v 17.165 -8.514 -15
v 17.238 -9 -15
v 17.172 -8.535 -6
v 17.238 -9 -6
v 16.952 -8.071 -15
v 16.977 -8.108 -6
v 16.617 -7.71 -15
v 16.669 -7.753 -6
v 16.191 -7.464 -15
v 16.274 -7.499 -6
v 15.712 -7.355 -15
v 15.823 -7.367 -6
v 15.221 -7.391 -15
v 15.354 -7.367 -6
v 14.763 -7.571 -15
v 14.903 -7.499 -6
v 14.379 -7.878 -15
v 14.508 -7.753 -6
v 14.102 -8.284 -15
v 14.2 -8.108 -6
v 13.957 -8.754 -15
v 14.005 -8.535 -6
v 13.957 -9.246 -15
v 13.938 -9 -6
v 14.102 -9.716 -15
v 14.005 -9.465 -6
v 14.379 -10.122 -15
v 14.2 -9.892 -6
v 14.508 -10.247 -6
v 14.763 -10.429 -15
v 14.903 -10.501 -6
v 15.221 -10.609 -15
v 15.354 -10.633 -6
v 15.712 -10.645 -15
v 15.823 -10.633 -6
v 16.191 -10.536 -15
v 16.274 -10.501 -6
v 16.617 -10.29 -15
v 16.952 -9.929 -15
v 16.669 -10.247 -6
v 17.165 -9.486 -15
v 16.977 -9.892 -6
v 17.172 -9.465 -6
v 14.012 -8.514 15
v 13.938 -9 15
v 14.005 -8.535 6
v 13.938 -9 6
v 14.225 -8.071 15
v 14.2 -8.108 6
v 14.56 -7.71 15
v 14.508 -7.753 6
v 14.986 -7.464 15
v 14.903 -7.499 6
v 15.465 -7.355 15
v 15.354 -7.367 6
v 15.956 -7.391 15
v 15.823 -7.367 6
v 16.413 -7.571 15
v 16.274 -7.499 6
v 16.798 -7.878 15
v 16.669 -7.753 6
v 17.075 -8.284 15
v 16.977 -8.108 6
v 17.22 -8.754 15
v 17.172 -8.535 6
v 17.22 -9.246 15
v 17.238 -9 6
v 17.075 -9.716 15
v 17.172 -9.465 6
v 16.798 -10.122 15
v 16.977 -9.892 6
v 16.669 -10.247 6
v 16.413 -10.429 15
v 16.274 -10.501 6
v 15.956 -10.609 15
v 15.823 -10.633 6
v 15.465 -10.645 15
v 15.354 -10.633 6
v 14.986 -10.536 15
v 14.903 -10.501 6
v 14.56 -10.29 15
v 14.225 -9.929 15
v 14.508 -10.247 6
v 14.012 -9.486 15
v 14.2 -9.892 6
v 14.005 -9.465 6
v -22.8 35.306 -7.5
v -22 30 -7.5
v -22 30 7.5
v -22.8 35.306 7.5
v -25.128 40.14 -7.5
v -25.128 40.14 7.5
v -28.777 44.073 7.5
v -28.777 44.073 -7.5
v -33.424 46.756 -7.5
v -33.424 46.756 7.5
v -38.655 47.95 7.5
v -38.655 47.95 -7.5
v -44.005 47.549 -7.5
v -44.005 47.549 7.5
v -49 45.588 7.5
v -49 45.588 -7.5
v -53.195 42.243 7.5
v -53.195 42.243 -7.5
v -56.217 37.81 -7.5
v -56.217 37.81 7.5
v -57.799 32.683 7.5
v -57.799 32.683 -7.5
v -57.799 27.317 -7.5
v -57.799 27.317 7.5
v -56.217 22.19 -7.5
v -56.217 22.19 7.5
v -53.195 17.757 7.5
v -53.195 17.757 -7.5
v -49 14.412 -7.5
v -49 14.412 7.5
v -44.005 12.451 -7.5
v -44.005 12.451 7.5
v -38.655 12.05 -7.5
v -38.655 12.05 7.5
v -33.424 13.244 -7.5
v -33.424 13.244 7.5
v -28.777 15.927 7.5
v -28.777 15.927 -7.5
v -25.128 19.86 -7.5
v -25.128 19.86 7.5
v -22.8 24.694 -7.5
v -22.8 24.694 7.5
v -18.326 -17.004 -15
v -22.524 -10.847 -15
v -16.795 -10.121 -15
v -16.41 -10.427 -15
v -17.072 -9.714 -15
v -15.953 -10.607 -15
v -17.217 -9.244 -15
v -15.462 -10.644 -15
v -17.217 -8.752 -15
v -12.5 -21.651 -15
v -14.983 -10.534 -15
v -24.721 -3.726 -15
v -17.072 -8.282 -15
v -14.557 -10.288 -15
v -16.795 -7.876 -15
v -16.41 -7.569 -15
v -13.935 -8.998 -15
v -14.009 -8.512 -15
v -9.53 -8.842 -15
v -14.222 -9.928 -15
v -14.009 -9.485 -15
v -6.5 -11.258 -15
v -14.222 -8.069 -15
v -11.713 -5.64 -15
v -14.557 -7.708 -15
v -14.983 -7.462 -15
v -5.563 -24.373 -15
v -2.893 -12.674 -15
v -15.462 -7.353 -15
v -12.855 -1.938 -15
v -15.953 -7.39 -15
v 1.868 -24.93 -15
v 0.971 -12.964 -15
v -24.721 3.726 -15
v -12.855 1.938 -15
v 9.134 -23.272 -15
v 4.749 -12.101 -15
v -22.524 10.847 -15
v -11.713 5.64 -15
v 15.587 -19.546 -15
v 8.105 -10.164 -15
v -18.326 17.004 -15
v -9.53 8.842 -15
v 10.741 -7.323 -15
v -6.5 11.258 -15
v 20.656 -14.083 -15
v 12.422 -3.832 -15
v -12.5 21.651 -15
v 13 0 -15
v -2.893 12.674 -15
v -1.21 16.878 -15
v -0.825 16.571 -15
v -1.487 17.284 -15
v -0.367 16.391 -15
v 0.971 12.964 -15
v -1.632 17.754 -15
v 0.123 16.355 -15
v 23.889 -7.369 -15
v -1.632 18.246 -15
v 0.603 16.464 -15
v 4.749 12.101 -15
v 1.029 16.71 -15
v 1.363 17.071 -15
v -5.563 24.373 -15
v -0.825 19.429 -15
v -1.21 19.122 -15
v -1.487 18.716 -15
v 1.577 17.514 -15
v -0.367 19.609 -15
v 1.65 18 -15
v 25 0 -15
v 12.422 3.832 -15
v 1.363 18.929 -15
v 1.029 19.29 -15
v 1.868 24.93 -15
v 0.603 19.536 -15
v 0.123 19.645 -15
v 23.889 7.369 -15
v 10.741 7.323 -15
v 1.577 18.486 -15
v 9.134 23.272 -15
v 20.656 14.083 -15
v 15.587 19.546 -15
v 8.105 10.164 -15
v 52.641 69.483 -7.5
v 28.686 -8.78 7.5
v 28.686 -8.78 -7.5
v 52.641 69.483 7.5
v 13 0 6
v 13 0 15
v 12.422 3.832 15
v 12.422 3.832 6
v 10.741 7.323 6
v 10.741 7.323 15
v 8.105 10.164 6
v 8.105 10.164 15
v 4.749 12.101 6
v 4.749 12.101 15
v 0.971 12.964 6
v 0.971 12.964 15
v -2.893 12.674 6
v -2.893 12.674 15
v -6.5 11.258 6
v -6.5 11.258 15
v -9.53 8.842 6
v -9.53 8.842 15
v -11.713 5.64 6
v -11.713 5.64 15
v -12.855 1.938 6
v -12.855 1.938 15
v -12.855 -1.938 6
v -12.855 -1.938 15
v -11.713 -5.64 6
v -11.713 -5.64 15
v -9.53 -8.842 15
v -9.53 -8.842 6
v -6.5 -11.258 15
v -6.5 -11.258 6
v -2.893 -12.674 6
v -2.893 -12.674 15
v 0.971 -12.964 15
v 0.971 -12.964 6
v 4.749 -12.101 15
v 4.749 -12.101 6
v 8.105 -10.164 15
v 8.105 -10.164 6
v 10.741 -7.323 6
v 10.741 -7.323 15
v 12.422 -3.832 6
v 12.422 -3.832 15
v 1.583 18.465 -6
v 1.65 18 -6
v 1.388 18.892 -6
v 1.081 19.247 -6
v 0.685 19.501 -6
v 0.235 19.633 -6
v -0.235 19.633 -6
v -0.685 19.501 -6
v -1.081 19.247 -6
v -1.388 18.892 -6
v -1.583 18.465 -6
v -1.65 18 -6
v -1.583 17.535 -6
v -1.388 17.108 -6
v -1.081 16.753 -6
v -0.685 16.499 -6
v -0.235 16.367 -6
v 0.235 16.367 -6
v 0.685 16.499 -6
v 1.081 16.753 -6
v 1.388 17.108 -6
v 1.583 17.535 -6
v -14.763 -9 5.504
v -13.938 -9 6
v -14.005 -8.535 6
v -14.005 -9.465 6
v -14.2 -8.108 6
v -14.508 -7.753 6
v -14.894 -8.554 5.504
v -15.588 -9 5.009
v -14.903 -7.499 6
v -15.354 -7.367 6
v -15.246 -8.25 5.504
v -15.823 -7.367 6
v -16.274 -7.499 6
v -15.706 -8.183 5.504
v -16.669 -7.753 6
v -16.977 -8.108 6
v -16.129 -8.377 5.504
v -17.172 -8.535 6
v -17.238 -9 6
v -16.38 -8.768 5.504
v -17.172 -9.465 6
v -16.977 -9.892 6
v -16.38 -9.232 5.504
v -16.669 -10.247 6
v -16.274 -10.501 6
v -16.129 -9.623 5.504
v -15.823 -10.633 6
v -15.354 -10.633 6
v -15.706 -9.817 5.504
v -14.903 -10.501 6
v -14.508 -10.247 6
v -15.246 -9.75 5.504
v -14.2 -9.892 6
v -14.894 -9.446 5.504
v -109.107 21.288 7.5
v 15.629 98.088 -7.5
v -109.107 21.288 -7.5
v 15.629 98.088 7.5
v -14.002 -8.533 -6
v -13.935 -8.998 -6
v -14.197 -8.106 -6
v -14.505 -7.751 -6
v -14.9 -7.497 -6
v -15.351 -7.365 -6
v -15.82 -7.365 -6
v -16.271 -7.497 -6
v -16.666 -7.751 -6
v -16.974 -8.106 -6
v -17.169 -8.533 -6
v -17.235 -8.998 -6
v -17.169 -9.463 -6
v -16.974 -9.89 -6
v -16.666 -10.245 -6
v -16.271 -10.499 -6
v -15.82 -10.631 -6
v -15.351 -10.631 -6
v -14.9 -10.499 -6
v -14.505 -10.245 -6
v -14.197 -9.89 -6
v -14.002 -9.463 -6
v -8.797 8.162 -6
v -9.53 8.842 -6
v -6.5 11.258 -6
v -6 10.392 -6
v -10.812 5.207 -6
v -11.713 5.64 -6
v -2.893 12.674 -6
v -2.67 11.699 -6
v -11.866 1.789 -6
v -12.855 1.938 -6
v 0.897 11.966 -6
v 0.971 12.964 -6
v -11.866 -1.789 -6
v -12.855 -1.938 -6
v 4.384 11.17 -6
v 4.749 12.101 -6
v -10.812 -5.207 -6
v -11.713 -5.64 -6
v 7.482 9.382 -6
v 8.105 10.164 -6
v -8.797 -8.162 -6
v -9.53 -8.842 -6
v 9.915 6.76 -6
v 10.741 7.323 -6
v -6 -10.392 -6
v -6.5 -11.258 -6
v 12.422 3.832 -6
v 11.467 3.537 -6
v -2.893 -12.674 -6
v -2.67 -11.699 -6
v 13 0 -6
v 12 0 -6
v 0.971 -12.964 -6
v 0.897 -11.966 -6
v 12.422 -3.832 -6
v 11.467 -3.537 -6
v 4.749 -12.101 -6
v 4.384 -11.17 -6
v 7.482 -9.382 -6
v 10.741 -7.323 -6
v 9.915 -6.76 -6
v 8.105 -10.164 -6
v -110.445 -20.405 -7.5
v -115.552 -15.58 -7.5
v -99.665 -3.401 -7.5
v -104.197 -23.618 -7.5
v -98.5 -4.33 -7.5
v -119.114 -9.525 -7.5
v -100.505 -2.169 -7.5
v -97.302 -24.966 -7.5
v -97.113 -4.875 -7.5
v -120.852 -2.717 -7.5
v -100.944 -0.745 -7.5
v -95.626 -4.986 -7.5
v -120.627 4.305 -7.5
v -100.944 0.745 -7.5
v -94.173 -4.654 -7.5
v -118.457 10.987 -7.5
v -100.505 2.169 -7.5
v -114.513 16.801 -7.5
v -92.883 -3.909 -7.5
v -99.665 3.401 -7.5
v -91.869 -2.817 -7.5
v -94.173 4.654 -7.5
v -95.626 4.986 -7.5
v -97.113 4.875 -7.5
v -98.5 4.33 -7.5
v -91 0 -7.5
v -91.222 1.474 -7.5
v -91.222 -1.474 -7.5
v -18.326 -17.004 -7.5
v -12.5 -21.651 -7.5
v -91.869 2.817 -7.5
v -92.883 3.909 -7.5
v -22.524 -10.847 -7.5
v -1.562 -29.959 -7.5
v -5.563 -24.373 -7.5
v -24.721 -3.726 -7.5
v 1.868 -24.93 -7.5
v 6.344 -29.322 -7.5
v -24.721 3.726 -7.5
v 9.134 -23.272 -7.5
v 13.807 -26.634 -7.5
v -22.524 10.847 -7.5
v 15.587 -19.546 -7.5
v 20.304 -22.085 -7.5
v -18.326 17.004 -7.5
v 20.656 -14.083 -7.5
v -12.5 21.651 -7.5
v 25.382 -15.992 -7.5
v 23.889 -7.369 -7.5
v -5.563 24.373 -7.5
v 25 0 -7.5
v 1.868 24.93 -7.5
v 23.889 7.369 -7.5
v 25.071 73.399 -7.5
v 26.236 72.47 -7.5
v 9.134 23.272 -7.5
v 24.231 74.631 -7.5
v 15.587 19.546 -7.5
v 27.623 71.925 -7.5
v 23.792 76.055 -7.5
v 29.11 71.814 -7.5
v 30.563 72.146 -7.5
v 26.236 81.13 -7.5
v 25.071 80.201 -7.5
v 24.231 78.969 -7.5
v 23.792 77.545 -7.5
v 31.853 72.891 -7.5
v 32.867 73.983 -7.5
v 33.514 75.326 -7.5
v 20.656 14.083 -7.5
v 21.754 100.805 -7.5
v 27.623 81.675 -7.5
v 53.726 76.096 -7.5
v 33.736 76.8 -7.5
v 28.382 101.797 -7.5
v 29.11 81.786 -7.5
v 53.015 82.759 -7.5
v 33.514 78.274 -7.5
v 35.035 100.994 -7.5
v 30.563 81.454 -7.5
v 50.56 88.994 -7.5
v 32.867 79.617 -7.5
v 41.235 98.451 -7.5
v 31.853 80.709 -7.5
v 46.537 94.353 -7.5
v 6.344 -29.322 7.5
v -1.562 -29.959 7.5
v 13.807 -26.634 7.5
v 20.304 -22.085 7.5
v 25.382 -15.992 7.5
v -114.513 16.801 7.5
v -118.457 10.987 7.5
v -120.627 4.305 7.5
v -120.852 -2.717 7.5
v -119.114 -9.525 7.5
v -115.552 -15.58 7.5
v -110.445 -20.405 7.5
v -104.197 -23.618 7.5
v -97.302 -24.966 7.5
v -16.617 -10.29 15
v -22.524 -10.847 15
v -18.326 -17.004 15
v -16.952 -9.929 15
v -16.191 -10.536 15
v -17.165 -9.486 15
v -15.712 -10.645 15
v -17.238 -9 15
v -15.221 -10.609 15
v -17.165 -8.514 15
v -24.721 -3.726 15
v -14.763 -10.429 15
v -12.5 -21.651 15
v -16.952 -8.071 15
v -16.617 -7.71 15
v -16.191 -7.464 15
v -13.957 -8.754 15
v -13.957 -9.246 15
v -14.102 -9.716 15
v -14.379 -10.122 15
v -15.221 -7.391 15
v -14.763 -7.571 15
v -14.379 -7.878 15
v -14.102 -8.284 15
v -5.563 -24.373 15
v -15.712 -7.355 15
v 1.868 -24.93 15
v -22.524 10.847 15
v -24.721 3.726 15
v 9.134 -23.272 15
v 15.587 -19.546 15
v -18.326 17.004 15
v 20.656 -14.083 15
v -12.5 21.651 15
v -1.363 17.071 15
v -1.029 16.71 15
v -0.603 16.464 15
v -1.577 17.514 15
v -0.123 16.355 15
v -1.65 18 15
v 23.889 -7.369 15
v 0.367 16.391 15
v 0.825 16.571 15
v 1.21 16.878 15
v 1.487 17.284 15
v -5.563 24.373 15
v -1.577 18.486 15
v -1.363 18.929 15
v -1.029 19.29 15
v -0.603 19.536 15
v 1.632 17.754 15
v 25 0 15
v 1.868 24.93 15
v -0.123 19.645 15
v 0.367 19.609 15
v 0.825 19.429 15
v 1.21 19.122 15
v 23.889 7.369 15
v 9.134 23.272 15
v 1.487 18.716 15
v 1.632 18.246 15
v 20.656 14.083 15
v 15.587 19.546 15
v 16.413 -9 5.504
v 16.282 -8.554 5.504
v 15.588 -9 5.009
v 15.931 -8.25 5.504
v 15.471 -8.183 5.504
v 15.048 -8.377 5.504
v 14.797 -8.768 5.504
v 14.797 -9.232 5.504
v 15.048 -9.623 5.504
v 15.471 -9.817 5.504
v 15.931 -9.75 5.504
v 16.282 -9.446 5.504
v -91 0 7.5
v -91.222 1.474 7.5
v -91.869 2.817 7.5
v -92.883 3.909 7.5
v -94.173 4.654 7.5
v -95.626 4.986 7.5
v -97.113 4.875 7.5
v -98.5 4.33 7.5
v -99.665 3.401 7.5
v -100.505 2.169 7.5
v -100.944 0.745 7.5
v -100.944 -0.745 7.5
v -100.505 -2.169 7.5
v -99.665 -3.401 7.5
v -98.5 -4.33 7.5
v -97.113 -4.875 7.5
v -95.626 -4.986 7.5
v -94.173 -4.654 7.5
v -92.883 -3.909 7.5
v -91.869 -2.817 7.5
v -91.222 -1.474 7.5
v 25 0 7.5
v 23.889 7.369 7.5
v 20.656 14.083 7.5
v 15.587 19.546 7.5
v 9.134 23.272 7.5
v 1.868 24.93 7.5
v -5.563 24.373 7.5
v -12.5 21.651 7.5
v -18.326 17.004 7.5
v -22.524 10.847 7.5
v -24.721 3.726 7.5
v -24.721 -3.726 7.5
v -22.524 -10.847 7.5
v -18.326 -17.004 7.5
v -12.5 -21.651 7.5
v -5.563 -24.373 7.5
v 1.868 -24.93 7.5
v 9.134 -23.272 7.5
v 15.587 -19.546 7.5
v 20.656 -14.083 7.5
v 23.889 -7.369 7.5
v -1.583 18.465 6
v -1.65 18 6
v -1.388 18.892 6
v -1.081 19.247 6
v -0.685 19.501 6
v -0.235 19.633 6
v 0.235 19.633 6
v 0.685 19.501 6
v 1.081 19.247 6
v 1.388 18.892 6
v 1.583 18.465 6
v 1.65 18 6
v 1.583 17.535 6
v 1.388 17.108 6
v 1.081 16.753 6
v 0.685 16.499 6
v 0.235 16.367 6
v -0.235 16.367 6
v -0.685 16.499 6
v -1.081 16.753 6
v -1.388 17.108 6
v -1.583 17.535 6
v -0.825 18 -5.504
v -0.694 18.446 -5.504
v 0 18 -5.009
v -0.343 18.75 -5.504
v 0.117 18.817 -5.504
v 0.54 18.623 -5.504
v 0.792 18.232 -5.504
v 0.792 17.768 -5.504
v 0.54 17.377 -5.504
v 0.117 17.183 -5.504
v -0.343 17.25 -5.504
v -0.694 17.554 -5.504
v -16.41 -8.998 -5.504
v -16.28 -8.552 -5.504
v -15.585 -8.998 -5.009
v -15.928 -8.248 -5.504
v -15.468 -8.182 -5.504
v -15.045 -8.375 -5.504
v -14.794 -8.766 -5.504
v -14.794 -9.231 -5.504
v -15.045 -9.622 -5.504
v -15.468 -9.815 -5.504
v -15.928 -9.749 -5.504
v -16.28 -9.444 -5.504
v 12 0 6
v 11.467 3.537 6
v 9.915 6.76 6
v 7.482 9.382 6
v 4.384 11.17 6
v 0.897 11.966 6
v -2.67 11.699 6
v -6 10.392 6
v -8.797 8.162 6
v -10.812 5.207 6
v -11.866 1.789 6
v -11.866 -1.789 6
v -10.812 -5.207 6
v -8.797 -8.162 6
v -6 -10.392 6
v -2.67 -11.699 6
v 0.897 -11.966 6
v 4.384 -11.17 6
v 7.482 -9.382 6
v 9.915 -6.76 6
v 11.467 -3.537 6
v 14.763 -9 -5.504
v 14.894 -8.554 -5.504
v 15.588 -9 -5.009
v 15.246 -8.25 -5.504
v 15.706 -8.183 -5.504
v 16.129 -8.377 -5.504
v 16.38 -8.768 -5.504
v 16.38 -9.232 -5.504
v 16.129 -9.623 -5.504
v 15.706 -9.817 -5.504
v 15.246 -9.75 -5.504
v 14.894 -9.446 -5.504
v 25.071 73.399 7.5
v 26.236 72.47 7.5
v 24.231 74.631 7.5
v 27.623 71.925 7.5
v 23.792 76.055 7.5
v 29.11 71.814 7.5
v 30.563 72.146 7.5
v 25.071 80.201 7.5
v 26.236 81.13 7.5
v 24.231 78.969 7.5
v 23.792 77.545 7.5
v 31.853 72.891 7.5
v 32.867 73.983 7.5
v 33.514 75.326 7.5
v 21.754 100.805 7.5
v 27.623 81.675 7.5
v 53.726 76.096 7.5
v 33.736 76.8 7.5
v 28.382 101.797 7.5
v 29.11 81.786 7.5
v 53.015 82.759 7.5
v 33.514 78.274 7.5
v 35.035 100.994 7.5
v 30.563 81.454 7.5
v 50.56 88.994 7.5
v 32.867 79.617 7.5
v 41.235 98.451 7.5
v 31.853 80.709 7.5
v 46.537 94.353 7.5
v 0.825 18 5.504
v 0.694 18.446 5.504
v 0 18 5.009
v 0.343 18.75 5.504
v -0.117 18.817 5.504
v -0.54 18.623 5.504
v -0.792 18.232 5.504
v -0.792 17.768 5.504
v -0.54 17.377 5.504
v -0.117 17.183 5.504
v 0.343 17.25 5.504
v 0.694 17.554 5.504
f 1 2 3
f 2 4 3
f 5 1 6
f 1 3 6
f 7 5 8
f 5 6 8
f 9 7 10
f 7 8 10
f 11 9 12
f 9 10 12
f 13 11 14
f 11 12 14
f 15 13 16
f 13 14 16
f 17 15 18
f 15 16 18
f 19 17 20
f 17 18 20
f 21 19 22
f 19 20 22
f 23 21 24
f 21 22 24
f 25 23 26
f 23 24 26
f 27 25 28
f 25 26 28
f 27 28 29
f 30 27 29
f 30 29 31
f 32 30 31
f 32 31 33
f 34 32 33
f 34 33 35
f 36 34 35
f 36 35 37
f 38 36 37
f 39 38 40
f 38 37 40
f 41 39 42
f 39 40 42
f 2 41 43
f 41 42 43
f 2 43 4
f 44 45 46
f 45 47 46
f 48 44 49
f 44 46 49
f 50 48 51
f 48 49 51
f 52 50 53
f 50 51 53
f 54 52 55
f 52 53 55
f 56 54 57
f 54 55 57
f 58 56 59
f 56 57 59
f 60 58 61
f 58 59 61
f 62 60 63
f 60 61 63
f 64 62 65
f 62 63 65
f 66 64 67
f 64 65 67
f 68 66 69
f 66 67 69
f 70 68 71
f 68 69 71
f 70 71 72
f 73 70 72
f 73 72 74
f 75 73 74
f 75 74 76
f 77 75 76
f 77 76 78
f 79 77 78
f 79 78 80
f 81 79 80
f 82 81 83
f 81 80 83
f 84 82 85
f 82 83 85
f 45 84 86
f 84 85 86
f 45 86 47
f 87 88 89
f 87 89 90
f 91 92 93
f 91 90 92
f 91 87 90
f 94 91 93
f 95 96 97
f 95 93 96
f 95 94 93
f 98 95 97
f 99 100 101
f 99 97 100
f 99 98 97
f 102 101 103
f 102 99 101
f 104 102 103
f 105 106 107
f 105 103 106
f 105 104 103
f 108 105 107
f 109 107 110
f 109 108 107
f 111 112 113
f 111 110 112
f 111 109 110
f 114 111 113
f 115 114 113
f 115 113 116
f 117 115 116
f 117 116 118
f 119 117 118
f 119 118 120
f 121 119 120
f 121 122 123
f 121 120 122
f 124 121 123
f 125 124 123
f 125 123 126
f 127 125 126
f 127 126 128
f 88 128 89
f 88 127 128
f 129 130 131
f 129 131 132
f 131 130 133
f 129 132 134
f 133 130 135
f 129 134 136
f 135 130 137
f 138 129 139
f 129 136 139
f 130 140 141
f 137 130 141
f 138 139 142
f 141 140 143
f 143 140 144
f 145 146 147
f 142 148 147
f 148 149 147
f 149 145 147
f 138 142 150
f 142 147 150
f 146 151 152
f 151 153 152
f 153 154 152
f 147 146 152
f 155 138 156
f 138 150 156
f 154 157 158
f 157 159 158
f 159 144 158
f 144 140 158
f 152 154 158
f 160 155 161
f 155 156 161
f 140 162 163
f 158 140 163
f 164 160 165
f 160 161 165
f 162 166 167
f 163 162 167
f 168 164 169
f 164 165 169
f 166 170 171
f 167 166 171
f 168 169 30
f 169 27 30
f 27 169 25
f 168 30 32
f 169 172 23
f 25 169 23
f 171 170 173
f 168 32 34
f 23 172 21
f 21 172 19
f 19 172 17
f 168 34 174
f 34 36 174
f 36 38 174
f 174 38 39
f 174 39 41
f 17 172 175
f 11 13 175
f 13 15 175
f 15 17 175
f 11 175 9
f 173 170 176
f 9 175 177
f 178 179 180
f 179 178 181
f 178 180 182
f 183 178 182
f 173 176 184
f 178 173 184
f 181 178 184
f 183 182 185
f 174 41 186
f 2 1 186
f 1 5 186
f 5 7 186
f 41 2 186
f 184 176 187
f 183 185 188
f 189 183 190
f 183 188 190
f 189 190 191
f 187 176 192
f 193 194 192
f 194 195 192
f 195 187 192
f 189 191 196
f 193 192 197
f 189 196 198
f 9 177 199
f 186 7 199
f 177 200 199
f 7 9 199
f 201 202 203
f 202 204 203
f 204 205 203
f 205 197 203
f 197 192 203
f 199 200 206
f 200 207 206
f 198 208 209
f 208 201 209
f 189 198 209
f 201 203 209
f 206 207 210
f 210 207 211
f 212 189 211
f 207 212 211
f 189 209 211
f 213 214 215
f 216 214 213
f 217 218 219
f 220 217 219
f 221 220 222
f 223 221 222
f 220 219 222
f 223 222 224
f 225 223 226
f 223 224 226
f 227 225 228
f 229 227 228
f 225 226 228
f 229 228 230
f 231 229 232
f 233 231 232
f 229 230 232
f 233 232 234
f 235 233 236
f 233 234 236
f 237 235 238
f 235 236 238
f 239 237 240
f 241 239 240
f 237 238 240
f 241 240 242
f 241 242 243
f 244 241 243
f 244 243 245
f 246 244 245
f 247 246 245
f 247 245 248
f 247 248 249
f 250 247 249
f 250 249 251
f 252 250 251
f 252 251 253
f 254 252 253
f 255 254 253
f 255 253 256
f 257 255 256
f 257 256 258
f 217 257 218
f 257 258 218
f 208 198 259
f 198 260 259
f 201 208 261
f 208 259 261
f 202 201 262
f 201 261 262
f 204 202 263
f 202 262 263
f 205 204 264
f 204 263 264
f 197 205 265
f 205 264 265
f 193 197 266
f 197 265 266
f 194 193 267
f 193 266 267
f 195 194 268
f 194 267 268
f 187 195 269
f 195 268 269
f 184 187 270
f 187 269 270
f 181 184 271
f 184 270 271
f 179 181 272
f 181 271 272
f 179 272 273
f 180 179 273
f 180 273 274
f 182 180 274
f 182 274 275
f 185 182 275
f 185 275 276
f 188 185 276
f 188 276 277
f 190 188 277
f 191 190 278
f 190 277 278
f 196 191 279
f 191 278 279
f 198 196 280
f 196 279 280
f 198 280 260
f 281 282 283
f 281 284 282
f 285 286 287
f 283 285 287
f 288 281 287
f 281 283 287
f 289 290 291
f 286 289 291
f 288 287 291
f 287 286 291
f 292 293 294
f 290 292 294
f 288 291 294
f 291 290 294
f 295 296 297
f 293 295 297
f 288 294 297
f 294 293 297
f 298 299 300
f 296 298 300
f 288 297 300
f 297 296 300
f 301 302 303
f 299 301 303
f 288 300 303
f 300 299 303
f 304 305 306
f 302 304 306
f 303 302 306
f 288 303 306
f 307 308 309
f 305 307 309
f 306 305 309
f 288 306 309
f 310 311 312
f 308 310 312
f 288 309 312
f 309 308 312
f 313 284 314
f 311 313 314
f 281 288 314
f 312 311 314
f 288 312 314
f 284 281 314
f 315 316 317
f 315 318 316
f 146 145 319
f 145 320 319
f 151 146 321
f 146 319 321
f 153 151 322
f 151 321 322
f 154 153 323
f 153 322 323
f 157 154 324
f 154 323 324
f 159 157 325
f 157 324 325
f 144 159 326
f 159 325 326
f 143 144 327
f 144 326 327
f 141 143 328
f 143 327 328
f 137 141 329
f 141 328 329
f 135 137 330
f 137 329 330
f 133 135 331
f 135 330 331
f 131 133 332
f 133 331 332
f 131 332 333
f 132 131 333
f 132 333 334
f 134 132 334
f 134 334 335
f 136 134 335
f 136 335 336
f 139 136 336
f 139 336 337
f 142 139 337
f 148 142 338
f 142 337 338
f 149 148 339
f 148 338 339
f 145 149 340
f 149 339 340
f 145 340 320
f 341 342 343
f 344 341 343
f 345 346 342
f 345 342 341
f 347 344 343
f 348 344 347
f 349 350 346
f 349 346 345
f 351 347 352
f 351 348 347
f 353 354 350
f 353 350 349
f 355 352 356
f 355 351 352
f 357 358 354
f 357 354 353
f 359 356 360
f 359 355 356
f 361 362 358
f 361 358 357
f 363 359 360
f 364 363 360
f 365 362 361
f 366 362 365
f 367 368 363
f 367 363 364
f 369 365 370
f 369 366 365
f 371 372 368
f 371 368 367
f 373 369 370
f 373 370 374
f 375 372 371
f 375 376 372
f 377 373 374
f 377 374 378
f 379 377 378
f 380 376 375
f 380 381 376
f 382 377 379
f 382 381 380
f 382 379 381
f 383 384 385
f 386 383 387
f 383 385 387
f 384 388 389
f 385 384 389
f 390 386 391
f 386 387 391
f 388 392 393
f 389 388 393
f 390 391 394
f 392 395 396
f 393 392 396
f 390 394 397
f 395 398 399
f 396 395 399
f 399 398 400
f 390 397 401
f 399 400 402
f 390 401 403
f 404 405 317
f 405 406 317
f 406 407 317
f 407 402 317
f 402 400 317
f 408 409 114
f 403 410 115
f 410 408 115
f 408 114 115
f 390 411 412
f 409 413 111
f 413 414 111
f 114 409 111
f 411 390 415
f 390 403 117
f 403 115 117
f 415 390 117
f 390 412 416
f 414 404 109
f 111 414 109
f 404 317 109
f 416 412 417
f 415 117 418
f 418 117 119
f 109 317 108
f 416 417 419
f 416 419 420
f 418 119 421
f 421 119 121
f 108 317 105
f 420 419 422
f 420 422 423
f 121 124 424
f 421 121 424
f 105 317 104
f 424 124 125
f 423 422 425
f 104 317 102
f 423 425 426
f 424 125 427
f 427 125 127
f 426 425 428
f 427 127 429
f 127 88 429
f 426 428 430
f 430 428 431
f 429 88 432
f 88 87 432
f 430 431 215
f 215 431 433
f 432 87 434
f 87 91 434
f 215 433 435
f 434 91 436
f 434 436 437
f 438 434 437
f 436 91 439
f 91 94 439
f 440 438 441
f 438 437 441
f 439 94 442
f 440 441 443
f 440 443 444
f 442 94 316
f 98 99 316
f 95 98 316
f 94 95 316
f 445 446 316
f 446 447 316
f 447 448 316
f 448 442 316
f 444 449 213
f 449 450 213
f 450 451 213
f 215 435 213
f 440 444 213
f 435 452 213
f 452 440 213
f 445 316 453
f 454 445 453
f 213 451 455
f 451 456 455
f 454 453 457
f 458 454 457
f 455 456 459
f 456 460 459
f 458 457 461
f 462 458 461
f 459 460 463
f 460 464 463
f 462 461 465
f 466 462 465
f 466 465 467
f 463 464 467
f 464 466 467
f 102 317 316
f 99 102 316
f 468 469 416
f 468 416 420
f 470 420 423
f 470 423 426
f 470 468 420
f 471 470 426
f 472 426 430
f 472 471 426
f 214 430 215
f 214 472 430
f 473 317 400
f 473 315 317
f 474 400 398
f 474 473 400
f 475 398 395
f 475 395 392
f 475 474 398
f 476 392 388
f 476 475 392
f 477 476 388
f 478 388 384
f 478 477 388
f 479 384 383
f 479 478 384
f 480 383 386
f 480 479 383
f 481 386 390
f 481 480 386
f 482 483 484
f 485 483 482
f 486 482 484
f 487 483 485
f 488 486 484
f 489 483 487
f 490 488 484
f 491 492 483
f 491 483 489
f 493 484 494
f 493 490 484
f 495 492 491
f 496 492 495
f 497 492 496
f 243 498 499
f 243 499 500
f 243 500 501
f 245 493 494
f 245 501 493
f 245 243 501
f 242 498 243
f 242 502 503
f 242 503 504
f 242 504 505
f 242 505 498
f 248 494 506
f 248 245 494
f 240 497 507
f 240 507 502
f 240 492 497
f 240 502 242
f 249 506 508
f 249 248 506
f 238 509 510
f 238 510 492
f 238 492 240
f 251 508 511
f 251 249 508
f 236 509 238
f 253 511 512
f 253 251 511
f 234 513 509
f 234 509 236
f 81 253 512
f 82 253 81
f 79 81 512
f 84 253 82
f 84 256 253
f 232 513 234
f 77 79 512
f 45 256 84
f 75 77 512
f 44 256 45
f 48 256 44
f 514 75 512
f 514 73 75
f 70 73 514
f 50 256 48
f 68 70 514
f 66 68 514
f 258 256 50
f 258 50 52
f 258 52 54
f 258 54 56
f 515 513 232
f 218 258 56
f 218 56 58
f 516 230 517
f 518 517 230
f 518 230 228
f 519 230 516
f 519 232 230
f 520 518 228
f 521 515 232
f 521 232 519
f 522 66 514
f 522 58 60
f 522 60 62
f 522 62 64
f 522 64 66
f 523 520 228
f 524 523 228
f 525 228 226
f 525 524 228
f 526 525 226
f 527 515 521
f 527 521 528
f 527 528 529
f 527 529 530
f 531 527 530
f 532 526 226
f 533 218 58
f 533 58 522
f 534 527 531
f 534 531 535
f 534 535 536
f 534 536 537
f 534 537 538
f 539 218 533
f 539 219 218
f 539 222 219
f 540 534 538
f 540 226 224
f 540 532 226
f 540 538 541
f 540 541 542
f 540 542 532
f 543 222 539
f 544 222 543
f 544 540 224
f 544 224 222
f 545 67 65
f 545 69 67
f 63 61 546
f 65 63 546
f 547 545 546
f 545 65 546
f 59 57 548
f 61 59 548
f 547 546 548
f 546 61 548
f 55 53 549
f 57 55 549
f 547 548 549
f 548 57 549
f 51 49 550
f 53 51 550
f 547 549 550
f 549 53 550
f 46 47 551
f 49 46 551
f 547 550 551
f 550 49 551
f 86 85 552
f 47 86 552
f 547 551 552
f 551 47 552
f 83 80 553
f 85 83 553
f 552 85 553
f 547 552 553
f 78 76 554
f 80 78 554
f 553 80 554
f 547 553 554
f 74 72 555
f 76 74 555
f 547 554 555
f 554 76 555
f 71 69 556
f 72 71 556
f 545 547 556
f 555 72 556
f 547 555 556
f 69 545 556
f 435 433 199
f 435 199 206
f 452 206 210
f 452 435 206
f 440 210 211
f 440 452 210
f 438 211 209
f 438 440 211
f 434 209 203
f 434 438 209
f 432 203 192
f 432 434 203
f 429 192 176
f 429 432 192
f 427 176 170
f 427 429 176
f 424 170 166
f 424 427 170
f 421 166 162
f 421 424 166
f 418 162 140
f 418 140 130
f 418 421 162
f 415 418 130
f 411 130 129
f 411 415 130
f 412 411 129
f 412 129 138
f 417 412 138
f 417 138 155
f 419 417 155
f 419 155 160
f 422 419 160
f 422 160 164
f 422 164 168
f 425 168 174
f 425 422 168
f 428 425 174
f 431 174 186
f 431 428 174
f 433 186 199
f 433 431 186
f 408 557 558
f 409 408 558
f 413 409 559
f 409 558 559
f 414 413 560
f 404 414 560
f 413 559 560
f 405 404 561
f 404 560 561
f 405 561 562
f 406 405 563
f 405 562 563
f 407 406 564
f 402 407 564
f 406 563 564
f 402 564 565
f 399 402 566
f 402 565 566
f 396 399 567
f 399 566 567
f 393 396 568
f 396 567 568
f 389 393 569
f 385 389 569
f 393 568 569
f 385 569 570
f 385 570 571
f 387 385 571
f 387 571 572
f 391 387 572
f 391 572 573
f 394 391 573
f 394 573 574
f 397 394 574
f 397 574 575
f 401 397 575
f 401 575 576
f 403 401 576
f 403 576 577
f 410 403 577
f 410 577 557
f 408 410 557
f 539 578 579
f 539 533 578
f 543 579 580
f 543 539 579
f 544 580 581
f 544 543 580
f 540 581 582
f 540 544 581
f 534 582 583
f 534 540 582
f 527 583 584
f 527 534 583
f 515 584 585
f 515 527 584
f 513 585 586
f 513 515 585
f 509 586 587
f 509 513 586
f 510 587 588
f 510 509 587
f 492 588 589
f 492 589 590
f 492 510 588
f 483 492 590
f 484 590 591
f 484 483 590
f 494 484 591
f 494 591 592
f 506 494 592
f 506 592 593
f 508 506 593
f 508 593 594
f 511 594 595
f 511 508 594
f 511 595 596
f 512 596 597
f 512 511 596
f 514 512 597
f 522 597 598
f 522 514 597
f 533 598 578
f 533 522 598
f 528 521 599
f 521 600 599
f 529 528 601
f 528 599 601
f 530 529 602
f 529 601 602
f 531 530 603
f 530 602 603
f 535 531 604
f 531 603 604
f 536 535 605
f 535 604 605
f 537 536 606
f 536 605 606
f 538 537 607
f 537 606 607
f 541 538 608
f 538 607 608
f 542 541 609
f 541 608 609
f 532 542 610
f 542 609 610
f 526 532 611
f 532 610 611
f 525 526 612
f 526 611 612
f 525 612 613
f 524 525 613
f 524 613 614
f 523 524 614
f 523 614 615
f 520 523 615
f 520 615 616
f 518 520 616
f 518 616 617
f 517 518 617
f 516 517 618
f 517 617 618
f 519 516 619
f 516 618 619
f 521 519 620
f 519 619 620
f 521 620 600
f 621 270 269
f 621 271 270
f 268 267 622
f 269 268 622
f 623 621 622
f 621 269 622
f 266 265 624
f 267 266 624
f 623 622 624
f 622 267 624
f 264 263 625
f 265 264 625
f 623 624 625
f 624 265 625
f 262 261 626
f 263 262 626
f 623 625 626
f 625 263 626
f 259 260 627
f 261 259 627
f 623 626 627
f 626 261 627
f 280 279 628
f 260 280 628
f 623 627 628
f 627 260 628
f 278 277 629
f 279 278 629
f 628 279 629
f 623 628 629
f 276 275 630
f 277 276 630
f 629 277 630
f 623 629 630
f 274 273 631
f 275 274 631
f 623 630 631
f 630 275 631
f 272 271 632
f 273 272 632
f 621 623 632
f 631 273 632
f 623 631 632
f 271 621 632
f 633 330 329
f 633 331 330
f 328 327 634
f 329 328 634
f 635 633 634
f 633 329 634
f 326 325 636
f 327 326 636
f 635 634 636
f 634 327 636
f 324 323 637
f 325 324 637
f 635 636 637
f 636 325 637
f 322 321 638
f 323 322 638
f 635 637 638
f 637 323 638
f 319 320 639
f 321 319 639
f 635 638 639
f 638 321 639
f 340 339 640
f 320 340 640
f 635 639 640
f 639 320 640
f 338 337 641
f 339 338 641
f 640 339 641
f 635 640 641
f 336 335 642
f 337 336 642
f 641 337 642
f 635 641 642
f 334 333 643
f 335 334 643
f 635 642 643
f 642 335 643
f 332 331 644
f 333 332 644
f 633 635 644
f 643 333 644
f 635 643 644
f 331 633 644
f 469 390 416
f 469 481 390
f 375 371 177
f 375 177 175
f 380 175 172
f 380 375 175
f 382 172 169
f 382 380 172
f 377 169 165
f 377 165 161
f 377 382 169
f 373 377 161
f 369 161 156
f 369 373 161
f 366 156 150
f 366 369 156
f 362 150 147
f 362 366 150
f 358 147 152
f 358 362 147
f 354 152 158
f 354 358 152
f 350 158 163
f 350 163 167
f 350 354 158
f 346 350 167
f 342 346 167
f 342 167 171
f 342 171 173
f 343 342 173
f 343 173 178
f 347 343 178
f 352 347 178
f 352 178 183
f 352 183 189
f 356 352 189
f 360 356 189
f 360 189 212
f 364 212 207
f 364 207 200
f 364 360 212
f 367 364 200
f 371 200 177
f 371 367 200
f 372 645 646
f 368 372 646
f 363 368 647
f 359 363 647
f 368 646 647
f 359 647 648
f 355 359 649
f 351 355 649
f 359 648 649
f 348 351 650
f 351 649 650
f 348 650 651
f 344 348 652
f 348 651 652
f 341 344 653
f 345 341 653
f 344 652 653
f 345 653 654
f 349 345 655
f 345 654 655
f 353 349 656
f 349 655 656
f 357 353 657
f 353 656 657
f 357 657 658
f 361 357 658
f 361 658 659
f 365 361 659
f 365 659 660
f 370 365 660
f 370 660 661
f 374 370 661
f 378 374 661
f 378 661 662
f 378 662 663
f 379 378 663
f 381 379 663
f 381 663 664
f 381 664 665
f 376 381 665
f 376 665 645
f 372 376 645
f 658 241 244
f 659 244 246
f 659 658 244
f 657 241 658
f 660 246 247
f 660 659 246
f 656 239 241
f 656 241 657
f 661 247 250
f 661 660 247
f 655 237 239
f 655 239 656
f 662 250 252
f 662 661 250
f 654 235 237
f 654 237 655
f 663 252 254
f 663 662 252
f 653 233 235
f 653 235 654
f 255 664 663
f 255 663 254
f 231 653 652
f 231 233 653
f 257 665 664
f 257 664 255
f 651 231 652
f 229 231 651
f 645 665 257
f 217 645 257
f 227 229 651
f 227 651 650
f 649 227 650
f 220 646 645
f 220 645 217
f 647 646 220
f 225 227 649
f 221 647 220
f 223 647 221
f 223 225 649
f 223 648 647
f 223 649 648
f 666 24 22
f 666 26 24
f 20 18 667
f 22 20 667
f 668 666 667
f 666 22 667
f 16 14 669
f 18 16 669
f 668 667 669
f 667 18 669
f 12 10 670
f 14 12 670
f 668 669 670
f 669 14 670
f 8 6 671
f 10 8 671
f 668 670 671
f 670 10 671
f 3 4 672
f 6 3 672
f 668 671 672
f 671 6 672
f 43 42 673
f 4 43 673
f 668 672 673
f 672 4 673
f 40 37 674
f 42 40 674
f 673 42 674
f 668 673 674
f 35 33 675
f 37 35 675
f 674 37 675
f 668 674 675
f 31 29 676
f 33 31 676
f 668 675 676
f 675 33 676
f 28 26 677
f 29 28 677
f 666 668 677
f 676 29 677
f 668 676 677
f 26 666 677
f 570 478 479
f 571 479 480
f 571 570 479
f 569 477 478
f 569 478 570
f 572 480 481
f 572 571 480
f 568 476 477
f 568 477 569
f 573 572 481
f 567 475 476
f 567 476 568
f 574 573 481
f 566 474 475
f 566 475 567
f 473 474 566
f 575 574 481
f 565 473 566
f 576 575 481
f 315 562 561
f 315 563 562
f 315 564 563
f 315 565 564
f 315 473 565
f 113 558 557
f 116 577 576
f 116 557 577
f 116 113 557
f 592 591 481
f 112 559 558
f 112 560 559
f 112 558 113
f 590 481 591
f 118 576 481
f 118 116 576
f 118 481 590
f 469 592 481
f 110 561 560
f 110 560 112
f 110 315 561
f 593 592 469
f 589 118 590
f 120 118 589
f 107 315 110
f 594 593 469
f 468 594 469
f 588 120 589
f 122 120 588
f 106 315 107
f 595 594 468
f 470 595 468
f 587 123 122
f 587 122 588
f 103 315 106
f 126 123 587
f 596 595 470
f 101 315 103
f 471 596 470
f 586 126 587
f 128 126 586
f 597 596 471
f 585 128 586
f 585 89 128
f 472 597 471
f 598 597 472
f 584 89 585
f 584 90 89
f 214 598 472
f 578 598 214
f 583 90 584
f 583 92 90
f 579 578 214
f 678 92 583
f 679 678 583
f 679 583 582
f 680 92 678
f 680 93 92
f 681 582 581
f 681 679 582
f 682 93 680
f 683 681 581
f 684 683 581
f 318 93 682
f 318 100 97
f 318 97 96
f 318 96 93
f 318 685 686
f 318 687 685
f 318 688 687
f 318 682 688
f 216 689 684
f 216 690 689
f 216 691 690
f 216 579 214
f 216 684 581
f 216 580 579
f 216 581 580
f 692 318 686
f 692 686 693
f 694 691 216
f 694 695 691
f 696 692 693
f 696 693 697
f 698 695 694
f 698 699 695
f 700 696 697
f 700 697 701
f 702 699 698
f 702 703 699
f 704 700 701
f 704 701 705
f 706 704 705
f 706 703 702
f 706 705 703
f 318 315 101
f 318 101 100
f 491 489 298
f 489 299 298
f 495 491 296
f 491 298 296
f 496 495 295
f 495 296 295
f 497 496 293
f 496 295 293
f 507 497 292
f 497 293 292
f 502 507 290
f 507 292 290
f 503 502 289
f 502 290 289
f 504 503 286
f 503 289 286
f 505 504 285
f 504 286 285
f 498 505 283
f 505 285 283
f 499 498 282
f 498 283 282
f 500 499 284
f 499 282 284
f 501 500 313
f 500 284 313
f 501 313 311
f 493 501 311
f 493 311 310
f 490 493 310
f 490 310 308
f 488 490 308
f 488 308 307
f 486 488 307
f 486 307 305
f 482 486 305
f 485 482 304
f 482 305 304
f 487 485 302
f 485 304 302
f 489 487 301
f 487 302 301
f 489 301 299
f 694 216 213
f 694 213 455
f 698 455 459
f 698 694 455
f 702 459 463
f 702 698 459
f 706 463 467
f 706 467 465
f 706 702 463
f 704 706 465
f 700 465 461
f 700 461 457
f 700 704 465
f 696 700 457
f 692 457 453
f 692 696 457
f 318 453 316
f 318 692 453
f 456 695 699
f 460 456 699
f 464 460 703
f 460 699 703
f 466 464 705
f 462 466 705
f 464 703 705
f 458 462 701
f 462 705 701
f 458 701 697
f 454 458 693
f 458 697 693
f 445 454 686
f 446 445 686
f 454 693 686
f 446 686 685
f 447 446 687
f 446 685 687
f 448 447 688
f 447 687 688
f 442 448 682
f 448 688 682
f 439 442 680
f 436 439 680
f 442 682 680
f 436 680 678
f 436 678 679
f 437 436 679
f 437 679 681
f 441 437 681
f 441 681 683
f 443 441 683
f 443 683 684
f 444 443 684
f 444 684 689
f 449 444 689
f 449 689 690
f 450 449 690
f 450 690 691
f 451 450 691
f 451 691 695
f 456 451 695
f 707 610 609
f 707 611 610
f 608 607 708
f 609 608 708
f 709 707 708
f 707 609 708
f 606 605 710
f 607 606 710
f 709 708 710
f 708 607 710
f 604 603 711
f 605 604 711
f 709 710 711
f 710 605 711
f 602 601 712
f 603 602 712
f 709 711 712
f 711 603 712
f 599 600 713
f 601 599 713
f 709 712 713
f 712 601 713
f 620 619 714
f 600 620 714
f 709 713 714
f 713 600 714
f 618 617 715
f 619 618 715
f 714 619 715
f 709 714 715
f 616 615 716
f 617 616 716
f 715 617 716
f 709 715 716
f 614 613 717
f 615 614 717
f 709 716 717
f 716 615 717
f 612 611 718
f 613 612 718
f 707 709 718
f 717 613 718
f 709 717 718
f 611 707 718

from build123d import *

# Parameters (mm, degrees)
BASELINE_BODY_DEPTH          = 7.5
SKETCH3_R                    = 5
CUT_EXTRUDE1_DEPTH           = 159.837149307
SKETCH4_R                    = 25
BOSS_EXTRUDE2_DEPTH          = 15
SKETCH5_R                    = 12
CUT_EXTRUDE2_DEPTH           = 161.947941894
SKETCH6_R                    = 13
CUT_EXTRUDE3_DEPTH           = 9
CUT_EXTRUDE4_START           = -9
SKETCH7_R                    = 13
CUT_EXTRUDE4_DEPTH           = 9
M4_TAPPED_HOLE6_D            = 3.3
M4_TAPPED_HOLE6_DEPTH        = 9
M4_TAPPED_HOLE6_TIP          = 0.991420021
M4_TAPPED_HOLE8_D            = 3.3
M4_TAPPED_HOLE8_DEPTH        = 9
M4_TAPPED_HOLE8_TIP          = 0.991420021
LIGHTENING_WINDOW_DEPTH      = 160.720036314
LIGHTENING_WINDOW_DEPTH_BACK = 160.720036314
SKETCH17_R                   = 18


with BuildPart() as part:
    # Rocker_Profile → Baseline_Body (new, symmetric)
    with BuildSketch(Plane.XY):
        with BuildLine():
            Line((-97.302083333, -24.966068553), (-1.5625, -29.959282264))
            ThreePointArc((-1.5625, -29.959282264), (17.206458335, -24.57514581), (28.686326507, -8.780357142))
            Line((28.686326507, -8.780357142), (52.641312178, 69.483035715))
            ThreePointArc((52.641312178, 69.483035715), (44.023831603, 96.580885487), (15.628732451, 98.088458997))
            Line((15.628732451, 98.088458997), (-109.107307638, 21.288458997))
            ThreePointArc((-109.107307638, 21.288458997), (-120.2235003, -6.182397046), (-97.302083333, -24.966068553))
        make_face()
    extrude(amount=BASELINE_BODY_DEPTH, both=True)

    # Sketch3 → Cut-Extrude1 (cut, through all)
    with BuildSketch(Plane.XY.offset(7.5)):
        with Locations((-96, 0)):
            Circle(SKETCH3_R)
        with Locations((28.736040089, 76.8)):
            Circle(SKETCH3_R)
    extrude(amount=-CUT_EXTRUDE1_DEPTH, mode=Mode.SUBTRACT)

    # Sketch4 → Boss-Extrude2 (add, symmetric)
    with BuildSketch(Plane.XY):
        Circle(SKETCH4_R)
    extrude(amount=BOSS_EXTRUDE2_DEPTH, both=True)

    # Sketch5 → Cut-Extrude2 (cut, through all)
    with BuildSketch(Plane.XY.offset(15)):
        Circle(SKETCH5_R)
    extrude(amount=-CUT_EXTRUDE2_DEPTH, mode=Mode.SUBTRACT)

    # Sketch6 → Cut-Extrude3 (cut)
    with BuildSketch(Plane.XY.offset(15)):
        Circle(SKETCH6_R)
    extrude(amount=-CUT_EXTRUDE3_DEPTH, mode=Mode.SUBTRACT)

    # Sketch7 → Cut-Extrude4 (cut)
    with BuildSketch(Plane(origin=(0, 0, -15), x_dir=(-1, 0, 0), z_dir=(0, 0, -1)).offset(CUT_EXTRUDE4_START)):
        with Locations(Location((0, 0, 0), (0, 0, 180))):
            Circle(SKETCH7_R)
    extrude(amount=CUT_EXTRUDE4_DEPTH, mode=Mode.SUBTRACT)

    # M4 Tapped Hole6
    with Locations(Plane.XY.offset(15)):
        with Locations((-15.588457268, -9), (0, 18), (15.588457268, -9)):
            Hole(M4_TAPPED_HOLE6_D / 2, depth=M4_TAPPED_HOLE6_DEPTH)
            with Locations((0, 0, -(M4_TAPPED_HOLE6_DEPTH + M4_TAPPED_HOLE6_TIP / 2))):  # 118° drill point
                Cone(0, M4_TAPPED_HOLE6_D / 2, M4_TAPPED_HOLE6_TIP, mode=Mode.SUBTRACT)

    # M4 Tapped Hole8
    with Locations(Plane(origin=(0, 0, -15), x_dir=(-1, 0, 0), z_dir=(0, 0, -1))):
        with Locations((-15.588457268, -9), (0, 18), (15.585467422, -8.998273811)):
            Hole(M4_TAPPED_HOLE8_D / 2, depth=M4_TAPPED_HOLE8_DEPTH)
            with Locations((0, 0, -(M4_TAPPED_HOLE8_DEPTH + M4_TAPPED_HOLE8_TIP / 2))):  # 118° drill point
                Cone(0, M4_TAPPED_HOLE8_D / 2, M4_TAPPED_HOLE8_TIP, mode=Mode.SUBTRACT)

    # Sketch17 → Lightening_Window (cut, two sides: drawn at the far end of the back side and taken through both)
    with BuildSketch(Plane.XY.offset(7.5).offset(-LIGHTENING_WINDOW_DEPTH_BACK)):
        with Locations((-40, 30)):
            Circle(SKETCH17_R)
    extrude(amount=LIGHTENING_WINDOW_DEPTH + LIGHTENING_WINDOW_DEPTH_BACK, mode=Mode.SUBTRACT)


solid = part.part
